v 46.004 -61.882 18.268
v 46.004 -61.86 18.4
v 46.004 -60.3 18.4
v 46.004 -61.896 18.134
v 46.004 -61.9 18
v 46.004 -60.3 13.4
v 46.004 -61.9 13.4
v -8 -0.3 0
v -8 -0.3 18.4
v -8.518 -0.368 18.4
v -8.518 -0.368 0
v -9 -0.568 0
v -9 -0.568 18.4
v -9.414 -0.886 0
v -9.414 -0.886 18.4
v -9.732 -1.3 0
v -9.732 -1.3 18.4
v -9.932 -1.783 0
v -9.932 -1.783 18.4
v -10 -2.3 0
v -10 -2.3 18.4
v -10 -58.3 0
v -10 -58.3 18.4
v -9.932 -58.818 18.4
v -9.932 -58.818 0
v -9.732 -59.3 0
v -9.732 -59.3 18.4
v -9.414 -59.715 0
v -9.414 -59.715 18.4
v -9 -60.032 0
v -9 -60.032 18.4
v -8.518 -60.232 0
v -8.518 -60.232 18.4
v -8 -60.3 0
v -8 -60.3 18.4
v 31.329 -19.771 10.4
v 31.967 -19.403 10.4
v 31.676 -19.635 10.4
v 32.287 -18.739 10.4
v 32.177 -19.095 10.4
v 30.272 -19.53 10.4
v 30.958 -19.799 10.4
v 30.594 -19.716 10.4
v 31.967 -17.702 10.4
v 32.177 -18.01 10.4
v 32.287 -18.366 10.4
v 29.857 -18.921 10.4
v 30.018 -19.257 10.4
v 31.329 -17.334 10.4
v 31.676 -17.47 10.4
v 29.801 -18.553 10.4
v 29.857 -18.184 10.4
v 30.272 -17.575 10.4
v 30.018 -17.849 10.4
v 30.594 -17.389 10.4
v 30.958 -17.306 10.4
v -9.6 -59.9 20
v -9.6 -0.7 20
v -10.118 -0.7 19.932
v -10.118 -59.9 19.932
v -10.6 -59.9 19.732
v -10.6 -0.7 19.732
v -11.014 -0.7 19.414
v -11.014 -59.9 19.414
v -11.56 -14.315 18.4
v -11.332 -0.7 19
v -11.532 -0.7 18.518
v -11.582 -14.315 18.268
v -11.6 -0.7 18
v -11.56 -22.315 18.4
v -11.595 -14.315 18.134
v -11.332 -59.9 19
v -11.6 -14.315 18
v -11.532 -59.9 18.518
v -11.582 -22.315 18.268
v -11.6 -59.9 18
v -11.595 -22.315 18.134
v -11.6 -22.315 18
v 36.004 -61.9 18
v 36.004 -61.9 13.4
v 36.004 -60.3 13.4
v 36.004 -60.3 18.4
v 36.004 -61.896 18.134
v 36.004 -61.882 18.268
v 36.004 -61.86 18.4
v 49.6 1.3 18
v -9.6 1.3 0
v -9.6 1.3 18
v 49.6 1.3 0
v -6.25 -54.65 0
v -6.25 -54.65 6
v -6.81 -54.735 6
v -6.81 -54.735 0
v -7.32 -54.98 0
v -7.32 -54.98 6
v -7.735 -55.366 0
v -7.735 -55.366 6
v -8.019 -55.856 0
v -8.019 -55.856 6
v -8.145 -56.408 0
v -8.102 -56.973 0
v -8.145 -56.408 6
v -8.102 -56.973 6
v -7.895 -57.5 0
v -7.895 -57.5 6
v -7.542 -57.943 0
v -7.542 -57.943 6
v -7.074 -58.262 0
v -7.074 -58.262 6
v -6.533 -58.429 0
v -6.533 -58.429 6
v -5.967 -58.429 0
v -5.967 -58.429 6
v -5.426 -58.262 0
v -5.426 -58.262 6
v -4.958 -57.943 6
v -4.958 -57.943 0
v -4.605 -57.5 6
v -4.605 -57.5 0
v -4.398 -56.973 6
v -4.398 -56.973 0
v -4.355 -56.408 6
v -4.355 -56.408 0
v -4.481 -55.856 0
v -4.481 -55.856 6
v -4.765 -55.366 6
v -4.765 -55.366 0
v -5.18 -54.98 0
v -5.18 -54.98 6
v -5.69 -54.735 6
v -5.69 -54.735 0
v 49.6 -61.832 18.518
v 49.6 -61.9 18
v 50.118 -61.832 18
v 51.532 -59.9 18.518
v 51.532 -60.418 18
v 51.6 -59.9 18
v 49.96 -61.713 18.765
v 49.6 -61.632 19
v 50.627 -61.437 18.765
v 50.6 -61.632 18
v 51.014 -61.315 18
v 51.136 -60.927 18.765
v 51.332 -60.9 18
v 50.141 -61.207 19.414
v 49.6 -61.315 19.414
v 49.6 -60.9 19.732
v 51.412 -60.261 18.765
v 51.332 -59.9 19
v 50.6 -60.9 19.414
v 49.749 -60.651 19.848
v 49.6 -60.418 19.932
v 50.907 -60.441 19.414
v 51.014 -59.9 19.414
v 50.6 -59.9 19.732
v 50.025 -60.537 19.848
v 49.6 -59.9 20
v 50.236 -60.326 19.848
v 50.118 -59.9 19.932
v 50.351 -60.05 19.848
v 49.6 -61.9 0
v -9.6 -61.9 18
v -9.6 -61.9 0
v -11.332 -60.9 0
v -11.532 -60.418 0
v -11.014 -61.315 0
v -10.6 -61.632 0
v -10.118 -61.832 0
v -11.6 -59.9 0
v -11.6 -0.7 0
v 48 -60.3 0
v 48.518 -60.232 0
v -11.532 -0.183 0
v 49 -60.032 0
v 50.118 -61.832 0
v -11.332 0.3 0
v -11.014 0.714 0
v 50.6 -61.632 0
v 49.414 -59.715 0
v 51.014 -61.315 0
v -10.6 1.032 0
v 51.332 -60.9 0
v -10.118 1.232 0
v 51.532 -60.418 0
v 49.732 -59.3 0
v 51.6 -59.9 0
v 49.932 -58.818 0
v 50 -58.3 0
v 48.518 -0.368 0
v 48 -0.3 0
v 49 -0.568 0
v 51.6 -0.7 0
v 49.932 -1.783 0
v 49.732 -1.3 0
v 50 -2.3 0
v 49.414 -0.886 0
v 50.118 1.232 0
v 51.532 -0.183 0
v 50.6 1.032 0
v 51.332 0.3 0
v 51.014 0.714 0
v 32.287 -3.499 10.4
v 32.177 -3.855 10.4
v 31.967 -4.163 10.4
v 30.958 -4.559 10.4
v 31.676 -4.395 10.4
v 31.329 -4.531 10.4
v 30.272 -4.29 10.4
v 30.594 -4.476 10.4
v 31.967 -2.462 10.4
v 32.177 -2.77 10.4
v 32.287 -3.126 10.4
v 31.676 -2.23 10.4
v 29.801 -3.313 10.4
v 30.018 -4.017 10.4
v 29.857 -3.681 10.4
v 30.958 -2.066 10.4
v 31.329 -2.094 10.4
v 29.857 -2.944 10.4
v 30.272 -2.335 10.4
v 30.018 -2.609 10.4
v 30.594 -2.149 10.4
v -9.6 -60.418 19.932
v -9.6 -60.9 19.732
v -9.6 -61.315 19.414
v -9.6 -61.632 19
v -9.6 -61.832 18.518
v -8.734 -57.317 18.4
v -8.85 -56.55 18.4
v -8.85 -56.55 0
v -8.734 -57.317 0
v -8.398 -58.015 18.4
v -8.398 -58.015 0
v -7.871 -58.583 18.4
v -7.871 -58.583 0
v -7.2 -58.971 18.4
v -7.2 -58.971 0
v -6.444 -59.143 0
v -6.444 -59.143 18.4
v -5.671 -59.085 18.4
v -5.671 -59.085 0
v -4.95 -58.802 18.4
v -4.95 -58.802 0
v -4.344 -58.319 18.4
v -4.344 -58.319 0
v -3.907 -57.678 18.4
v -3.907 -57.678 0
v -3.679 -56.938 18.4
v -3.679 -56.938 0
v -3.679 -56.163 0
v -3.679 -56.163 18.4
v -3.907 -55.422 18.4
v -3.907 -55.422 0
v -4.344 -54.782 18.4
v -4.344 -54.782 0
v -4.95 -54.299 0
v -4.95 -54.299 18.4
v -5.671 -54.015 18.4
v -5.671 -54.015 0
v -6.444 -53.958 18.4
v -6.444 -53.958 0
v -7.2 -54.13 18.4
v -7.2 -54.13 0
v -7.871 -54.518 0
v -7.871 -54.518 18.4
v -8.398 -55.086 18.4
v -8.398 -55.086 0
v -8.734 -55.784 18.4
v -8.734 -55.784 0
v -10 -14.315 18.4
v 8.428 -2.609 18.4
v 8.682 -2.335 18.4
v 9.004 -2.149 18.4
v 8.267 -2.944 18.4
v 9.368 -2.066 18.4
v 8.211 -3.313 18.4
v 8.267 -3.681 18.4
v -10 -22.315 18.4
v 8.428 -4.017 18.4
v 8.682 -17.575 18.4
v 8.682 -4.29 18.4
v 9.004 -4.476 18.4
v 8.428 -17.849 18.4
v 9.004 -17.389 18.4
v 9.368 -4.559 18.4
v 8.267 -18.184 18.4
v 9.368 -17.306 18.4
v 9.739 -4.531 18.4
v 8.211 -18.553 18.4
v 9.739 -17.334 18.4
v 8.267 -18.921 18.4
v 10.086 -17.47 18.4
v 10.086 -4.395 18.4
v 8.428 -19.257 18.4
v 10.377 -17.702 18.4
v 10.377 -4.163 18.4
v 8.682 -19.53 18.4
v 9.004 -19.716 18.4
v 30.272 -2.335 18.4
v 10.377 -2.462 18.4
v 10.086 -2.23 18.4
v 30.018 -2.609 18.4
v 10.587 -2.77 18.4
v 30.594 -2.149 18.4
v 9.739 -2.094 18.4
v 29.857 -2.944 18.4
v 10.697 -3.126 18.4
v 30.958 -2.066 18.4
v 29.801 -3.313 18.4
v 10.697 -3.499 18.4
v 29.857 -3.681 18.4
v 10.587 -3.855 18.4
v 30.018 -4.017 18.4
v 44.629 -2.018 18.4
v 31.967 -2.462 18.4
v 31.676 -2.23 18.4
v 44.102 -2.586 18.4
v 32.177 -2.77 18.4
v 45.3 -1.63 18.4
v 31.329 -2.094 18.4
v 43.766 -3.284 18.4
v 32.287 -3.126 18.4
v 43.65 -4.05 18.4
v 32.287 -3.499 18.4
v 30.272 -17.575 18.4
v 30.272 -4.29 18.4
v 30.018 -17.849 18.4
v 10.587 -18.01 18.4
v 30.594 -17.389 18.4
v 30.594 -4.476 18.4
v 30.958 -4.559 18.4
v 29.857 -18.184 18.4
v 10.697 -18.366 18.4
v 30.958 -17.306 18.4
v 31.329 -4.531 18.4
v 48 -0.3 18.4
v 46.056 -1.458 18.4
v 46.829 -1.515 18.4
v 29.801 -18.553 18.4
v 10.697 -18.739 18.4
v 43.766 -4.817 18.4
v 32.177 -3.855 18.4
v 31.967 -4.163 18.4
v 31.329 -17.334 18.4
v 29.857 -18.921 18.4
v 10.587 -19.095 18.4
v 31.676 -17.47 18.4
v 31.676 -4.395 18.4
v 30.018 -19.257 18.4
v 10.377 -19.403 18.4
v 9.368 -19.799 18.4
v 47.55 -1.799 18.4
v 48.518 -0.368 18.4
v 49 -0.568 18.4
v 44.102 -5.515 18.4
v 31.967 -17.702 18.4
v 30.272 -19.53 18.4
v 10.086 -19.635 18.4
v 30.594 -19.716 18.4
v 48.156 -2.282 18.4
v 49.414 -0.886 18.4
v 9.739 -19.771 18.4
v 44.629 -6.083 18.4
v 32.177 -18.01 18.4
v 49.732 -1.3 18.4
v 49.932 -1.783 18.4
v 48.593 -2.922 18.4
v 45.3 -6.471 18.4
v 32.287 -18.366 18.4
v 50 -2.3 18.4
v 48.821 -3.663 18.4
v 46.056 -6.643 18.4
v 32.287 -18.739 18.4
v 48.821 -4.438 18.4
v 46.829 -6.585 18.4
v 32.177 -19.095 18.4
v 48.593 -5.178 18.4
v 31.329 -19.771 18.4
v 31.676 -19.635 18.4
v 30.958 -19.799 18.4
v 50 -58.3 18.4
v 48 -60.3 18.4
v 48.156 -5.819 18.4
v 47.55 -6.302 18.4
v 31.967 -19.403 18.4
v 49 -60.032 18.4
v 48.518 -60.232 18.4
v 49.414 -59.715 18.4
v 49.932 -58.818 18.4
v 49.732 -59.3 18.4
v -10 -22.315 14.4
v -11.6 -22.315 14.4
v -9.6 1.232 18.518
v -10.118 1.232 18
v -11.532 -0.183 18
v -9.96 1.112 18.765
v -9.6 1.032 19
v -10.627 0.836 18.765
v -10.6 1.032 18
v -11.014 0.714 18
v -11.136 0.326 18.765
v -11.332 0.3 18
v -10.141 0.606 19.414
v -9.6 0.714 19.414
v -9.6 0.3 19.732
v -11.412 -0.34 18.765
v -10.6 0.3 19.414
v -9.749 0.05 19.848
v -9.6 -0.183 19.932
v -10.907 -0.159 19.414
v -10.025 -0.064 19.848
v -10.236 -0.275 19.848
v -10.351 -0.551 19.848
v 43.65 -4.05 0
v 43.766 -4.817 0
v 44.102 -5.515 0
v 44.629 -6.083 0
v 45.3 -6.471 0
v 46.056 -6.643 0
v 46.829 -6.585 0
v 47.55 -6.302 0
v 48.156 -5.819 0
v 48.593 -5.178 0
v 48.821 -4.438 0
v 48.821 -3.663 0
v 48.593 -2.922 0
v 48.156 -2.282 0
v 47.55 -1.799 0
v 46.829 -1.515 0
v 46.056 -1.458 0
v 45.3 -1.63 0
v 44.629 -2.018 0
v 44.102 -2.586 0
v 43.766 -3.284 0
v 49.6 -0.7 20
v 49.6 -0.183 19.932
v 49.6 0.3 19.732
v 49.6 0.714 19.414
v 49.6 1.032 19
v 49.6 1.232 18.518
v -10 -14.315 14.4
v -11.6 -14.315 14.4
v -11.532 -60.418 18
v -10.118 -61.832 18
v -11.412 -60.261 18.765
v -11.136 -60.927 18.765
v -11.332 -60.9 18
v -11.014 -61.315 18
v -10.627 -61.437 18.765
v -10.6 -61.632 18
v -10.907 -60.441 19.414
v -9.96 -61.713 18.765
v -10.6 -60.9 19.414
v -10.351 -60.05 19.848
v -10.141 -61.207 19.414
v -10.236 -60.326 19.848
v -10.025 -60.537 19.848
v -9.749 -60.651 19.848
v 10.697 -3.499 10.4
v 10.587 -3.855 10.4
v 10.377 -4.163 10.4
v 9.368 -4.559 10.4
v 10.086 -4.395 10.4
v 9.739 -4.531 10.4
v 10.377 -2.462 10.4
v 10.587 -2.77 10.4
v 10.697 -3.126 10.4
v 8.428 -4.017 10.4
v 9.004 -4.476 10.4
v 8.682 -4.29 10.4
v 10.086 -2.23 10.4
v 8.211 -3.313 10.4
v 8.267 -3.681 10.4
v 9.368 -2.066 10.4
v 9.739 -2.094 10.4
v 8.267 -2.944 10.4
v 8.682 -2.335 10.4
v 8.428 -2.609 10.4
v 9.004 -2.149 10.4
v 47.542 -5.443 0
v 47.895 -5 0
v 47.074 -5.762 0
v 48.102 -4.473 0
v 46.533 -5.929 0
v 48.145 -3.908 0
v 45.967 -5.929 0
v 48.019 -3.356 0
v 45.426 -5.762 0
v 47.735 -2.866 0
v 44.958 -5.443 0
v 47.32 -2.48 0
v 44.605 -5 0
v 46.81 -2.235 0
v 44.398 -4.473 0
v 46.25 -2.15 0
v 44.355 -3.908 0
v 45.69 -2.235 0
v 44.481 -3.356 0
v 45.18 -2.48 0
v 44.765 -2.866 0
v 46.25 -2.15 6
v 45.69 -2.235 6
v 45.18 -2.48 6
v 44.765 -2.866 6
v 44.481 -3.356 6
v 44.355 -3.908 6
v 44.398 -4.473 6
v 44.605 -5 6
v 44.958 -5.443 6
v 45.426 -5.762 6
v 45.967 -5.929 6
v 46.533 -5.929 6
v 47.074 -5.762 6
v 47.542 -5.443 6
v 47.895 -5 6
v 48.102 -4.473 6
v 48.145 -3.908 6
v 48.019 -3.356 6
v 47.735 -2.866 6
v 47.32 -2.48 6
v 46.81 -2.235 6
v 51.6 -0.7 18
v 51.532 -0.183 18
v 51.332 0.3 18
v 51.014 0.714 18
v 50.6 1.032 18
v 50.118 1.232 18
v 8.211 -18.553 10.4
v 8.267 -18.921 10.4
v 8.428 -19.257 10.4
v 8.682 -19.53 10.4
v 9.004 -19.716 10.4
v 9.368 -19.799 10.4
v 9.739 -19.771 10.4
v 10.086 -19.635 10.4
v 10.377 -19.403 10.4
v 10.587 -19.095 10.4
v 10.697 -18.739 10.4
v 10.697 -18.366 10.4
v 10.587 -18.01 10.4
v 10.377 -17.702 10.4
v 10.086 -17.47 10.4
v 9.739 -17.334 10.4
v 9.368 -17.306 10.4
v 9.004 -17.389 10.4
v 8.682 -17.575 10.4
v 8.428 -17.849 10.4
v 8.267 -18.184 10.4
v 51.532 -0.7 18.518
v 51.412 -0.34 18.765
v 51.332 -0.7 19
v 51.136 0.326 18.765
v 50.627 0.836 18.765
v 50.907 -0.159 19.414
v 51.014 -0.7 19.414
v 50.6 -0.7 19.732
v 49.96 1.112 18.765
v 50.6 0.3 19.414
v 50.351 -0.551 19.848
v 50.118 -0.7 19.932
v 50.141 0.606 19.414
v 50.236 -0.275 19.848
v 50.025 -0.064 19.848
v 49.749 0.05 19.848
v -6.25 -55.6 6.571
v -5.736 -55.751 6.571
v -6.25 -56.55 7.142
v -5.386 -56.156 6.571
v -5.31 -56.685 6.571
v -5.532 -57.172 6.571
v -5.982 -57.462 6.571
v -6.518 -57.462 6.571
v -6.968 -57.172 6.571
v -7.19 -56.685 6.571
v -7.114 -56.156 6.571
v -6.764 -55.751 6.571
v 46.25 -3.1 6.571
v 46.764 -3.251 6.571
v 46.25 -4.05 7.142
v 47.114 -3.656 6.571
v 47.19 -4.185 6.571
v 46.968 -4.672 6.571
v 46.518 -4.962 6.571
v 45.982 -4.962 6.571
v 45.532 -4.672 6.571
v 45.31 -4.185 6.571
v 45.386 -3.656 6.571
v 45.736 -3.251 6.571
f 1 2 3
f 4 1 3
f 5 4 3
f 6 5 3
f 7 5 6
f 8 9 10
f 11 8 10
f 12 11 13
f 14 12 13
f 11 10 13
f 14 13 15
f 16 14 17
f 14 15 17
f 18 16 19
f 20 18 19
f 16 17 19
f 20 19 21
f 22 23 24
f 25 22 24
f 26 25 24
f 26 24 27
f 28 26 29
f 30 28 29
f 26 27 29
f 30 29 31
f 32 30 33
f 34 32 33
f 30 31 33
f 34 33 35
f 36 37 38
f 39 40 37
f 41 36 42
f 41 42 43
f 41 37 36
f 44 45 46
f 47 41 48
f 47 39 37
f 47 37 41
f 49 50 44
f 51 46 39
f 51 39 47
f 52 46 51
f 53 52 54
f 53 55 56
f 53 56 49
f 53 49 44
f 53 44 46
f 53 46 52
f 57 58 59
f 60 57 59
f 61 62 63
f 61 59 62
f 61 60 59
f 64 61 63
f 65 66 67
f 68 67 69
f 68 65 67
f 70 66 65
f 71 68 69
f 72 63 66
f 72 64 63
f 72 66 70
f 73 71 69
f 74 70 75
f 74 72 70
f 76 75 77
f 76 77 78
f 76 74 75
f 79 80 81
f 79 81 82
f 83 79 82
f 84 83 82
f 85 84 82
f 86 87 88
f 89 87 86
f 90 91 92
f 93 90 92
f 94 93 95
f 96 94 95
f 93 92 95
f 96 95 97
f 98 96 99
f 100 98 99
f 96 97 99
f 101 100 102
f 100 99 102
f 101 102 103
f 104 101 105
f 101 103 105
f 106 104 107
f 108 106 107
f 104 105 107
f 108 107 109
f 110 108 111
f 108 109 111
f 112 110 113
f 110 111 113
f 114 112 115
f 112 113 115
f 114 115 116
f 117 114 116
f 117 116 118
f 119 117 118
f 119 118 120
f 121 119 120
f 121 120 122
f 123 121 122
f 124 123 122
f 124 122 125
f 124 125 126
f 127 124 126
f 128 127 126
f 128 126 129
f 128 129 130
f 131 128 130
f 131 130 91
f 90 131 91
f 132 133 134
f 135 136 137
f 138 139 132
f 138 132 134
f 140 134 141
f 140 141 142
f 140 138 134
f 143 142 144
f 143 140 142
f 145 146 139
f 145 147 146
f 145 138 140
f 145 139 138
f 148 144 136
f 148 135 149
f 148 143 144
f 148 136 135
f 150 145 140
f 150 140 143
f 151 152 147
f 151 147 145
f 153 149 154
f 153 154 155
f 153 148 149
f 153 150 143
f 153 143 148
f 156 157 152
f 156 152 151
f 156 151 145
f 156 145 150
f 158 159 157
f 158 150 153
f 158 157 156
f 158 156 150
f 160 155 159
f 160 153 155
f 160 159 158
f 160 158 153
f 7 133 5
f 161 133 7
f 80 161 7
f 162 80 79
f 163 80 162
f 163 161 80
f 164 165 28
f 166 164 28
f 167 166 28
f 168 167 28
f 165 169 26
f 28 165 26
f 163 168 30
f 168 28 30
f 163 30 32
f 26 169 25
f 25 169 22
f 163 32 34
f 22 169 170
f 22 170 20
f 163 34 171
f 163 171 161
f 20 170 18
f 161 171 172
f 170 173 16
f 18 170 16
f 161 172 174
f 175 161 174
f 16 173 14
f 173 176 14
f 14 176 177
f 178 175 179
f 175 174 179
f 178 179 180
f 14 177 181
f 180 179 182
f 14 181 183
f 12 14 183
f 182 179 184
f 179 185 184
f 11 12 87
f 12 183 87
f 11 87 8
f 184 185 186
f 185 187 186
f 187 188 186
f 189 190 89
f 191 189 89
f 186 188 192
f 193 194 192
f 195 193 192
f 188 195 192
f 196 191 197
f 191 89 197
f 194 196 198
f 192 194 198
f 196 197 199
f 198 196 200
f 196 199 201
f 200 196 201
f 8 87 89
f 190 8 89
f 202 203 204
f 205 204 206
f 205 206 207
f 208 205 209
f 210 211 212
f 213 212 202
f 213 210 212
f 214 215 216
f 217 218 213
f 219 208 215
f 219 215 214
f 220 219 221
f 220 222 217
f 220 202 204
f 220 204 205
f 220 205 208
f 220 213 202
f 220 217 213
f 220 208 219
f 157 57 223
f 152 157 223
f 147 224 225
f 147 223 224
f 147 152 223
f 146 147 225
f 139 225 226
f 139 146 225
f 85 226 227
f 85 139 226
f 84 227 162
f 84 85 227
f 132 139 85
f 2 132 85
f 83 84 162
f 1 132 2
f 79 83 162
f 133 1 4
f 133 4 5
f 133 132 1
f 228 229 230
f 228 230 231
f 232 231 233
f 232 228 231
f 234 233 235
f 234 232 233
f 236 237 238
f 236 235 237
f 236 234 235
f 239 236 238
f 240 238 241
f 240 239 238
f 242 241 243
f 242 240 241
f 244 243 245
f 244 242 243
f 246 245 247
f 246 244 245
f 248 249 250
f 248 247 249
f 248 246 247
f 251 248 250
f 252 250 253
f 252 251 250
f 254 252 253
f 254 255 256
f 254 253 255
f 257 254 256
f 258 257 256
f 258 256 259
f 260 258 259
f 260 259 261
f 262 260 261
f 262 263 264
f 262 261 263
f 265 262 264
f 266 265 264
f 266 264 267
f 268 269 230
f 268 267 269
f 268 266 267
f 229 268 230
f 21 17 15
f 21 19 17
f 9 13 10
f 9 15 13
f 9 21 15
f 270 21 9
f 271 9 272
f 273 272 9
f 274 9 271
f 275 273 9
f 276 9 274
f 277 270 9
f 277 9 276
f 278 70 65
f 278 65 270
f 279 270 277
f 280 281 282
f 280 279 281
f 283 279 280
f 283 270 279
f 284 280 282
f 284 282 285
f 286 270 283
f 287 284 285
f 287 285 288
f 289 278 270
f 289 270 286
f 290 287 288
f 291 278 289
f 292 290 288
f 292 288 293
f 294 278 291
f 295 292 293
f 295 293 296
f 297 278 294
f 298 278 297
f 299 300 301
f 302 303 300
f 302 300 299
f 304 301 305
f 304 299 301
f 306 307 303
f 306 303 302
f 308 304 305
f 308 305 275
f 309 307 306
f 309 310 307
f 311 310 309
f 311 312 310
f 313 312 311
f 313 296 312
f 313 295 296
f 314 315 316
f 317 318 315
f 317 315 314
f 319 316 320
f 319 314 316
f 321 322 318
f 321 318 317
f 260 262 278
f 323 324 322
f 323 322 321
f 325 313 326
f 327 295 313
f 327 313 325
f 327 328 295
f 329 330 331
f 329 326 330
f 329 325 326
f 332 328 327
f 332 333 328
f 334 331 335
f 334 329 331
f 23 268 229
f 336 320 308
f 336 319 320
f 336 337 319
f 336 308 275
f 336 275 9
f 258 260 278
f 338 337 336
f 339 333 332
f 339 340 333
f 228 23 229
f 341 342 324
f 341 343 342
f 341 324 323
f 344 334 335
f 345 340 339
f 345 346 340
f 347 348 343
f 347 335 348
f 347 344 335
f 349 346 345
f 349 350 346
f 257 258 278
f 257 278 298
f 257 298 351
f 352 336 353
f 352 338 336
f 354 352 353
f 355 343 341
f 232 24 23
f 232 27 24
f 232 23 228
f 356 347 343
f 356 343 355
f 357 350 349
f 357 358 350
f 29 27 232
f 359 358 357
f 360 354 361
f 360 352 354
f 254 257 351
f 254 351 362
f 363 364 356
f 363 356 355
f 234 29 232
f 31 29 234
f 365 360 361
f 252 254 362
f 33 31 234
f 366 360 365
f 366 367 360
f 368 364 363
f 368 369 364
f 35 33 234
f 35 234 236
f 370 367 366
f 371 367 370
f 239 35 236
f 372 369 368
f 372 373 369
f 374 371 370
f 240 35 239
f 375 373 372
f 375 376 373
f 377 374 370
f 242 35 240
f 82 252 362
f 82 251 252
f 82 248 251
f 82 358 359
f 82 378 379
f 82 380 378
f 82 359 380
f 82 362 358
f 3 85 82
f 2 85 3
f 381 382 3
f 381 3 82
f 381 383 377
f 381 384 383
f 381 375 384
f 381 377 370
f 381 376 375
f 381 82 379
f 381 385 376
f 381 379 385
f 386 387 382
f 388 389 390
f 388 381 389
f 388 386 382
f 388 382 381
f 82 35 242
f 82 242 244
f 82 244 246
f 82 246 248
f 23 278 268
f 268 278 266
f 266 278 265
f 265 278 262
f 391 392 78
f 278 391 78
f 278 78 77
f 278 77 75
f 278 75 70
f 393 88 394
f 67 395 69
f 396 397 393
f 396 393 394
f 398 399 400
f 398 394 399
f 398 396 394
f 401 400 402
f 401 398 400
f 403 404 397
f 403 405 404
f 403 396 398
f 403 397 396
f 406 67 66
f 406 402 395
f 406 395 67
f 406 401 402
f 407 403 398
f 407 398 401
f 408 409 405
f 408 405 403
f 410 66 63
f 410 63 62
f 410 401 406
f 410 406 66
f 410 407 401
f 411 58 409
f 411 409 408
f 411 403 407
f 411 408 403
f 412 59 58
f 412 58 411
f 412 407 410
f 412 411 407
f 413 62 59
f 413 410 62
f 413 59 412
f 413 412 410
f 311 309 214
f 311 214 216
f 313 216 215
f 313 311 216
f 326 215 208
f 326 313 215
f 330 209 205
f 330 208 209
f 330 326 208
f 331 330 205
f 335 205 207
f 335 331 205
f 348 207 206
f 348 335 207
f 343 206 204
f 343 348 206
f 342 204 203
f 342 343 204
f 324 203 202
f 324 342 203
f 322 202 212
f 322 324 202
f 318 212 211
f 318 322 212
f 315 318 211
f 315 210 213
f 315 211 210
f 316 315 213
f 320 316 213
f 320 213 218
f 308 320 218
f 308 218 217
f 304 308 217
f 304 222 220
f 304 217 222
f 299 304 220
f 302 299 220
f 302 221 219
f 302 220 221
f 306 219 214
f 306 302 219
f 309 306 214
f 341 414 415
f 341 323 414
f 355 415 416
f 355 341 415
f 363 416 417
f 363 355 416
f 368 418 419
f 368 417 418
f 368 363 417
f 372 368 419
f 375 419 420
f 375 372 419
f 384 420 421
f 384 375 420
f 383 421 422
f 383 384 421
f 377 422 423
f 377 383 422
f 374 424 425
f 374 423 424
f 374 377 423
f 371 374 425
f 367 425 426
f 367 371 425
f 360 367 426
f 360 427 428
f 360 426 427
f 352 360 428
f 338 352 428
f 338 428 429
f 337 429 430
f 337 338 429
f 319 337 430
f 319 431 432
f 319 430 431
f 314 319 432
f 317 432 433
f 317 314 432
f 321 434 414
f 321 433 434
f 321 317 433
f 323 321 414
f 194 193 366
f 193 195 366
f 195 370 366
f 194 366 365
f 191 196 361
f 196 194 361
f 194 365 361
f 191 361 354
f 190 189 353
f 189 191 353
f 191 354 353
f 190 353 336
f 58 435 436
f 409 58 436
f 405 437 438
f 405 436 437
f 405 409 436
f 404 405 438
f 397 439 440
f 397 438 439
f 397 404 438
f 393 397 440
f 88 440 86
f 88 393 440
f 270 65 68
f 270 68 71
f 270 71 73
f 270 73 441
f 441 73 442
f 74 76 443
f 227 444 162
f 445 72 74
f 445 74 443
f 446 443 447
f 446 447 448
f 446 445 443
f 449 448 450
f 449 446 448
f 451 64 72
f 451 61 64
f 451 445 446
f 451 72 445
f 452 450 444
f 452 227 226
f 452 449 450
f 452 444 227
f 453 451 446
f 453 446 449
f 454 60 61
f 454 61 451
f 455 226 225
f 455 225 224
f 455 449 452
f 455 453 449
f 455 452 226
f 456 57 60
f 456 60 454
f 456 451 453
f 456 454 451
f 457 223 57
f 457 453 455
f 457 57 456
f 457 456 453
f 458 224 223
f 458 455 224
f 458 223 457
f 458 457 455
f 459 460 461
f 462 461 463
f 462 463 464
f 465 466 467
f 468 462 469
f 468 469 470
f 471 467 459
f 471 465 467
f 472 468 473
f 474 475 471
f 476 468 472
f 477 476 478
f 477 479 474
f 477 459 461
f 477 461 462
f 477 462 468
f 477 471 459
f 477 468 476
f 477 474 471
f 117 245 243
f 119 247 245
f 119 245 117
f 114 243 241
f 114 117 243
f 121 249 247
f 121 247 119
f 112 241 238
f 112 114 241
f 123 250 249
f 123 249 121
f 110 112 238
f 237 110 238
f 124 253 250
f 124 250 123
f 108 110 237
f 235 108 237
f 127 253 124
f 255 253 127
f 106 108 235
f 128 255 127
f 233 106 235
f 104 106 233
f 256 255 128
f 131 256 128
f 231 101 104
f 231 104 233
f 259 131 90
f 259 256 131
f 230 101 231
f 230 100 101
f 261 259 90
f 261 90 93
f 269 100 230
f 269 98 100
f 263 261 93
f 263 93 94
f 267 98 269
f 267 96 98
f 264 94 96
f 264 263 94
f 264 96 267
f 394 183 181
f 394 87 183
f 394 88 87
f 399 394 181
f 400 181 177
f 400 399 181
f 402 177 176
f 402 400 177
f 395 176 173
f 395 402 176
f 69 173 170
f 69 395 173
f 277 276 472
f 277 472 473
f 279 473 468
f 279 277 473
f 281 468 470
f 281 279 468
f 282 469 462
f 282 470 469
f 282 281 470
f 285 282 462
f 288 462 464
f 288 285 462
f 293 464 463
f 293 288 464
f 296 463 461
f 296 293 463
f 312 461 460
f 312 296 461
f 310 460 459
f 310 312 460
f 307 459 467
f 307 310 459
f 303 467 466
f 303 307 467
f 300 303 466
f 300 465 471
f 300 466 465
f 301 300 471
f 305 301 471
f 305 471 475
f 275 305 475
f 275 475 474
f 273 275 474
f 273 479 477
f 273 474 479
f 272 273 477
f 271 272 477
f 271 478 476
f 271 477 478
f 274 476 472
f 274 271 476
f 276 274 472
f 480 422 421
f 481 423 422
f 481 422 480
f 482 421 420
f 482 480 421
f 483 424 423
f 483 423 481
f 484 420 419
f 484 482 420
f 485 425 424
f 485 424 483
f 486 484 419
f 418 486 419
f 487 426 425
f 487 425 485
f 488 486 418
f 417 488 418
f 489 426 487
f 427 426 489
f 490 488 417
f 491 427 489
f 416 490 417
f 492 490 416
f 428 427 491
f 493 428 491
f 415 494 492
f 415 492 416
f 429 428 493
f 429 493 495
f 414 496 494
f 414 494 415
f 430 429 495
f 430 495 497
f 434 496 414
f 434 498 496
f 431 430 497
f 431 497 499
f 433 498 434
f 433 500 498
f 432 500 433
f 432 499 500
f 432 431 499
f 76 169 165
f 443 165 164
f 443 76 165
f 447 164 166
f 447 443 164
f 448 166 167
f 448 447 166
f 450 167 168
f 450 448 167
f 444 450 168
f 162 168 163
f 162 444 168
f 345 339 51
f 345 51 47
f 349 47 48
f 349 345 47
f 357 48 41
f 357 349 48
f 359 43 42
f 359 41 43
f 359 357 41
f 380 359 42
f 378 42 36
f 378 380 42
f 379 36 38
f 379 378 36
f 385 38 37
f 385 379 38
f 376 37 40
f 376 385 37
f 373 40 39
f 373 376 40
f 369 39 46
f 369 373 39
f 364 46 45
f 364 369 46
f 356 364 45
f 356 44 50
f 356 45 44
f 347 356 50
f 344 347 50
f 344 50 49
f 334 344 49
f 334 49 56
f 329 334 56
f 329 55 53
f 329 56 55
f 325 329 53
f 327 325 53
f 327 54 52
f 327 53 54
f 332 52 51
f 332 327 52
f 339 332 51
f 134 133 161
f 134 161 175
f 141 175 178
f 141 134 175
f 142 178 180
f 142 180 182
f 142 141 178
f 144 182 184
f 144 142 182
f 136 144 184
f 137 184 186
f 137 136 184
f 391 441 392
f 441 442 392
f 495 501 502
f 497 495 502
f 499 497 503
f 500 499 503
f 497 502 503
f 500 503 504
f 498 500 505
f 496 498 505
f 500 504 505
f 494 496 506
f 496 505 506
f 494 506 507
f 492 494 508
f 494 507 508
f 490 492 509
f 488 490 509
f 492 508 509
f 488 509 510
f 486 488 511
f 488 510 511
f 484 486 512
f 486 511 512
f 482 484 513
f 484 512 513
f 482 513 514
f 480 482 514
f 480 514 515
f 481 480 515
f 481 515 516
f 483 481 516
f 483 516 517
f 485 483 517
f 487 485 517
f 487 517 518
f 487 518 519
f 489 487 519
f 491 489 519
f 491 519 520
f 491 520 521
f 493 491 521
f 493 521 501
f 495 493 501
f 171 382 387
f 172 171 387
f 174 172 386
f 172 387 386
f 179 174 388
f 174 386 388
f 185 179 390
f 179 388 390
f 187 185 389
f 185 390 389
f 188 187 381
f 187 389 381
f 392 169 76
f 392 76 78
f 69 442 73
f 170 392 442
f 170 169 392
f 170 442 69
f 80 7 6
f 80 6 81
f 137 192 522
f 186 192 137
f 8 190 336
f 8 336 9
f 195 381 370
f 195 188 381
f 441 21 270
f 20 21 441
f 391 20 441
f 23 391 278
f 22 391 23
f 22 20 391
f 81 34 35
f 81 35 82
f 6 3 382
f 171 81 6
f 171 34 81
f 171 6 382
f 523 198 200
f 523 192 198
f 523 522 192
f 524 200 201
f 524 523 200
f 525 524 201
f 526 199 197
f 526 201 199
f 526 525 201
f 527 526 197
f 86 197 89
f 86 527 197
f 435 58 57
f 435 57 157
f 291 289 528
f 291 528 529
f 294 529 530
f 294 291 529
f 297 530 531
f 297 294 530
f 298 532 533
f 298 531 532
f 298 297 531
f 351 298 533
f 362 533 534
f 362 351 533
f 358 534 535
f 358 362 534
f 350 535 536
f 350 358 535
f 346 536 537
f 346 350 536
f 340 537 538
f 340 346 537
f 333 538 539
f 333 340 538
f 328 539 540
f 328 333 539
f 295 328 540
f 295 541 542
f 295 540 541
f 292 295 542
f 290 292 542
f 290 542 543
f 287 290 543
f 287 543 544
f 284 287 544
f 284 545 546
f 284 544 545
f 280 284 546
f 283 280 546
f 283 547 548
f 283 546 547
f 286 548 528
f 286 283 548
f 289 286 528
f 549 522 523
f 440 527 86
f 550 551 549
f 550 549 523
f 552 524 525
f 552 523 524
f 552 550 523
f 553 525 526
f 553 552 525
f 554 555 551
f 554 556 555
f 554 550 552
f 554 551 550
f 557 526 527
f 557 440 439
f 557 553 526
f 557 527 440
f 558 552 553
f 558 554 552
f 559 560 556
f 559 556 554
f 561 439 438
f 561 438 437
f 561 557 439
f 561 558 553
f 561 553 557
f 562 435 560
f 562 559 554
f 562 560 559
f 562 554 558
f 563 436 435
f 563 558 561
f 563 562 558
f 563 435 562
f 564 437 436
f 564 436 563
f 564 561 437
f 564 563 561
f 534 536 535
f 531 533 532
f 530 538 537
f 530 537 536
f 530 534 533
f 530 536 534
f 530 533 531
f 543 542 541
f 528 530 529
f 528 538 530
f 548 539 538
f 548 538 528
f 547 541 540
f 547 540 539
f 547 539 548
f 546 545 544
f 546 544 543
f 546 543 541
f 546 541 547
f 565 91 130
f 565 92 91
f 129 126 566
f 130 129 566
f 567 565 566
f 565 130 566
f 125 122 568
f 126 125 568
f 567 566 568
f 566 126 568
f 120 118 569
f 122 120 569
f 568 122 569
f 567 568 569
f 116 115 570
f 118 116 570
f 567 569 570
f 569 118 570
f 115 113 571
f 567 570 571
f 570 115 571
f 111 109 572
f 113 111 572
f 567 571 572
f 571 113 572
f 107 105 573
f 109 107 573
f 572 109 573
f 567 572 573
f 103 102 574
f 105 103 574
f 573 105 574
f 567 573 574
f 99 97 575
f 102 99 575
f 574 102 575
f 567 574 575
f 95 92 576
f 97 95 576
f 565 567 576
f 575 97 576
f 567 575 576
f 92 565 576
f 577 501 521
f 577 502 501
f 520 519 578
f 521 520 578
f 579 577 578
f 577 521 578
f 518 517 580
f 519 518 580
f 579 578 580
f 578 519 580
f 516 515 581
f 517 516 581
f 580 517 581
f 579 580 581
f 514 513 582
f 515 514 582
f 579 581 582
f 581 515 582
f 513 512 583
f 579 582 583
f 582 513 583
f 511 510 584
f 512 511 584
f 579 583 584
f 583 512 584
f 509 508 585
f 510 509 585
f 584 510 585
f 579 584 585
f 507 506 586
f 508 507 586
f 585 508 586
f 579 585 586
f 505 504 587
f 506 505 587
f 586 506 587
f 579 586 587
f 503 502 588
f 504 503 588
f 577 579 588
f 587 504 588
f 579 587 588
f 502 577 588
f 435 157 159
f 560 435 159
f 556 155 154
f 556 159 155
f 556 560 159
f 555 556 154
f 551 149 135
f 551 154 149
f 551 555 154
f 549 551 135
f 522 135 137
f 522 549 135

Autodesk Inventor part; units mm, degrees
ref_plane "YZ Plane" through (0, 0, 0) normal (1, 0, 0) x (0, 1, 0)
ref_plane "XZ Plane" through (0, 0, 0) normal (0, 1, 0) x (-1, 0, 0)
ref_plane "XY Plane" through (0, 0, 0) normal (0, 0, 1) x (1, 0, 0)
sketch "Sketch1" plane through (0, 0, 0) normal (0, 0, 1) x (1, 0, 0)
  line L0 (-10, -0.3003) -> (50, -0.3003)
  line L1 (50, -0.3003) -> (50, -60.3003)
  line L2 (50, -60.3003) -> (-10, -60.3003)
  line L3 (-10, -60.3003) -> (-10, -0.3003)
  line L4 (-11.6, 1.2997) -> (51.6, 1.2997)
  line L5 (51.6, 1.2997) -> (51.6, -61.9003)
  line L6 (51.6, -61.9003) -> (-11.6, -61.9003)
  line L7 (-11.6, -61.9003) -> (-11.6, 1.2997)
  point P0 (-10, -30.3003)
  point P1 (-11.6, -30.3003)
  dimension "d1" = 60
  dimension "d2" = 60
  dimension "d3" = 1.6
  dimension "d4" = 1.6
  dimension "d5" = 1.6
  dimension "d6" = 1.6
extrude "Extrusion1" add sketch "Sketch1" along normal blind 20 contours L0 L1 L2 L3 | L4 L5 L6 L7
sketch "Sketch2" plane through (0, 0, 0) normal (0, 0, -1) x (-1, 0, 0)
  line L0 (-50, -0.3003) -> (10, -0.3003)
  line L1 (10, -0.3003) -> (10, -60.3003)
  line L2 (10, -60.3003) -> (-50, -60.3003)
  line L3 (-50, -60.3003) -> (-50, -0.3003)
  line L4 (-51.6, 1.2997) -> (11.6, 1.2997) projected
  line L5 (11.6, -61.9003) -> (-51.6, -61.9003) projected
  line L6 (-51.6, -61.9003) -> (-51.6, 1.2997) projected
  line L7 (11.6, 1.2997) -> (11.6, -61.9003) projected
  point P0 (0, 0)
  dimension "d9" = 60
  dimension "d10" = 1.6
  dimension "d11" = 1.6
  dimension "d12" = 1.6
  dimension "d61" = 1.6
extrude "Extrusion2" cut sketch "Sketch2" against normal blind 18.4 contours L0 L1 L2 L3
sketch "Sketch3" plane through (-11.6, -61.9003, 0) normal (0, -1, 0) x (1, 0, 0)
  line L0 (57.6038, 13.4) -> (47.6038, 13.4)
  line L1 (47.6038, 13.4) -> (47.6038, 18.4)
  line L2 (47.6038, 18.4) -> (57.6038, 18.4)
  line L3 (57.6038, 18.4) -> (57.6038, 13.4)
  line L4 (0, 20) -> (63.2, 20) projected
  point P0 (11.6, 0)
  point P1 (52.6038, 18.4)
  dimension "d15" = 10
  dimension "d16" = 5
  dimension "d17" = 1.6
extrude "Extrusion3" cut sketch "Sketch3" against normal blind 18.4
fillet "Fillet1" radius 2 1 edges at (-11.6, -61.9003, 10)
fillet "Fillet2" radius 2 3 edges at (-11.6, 1.2997, 10) (51.6, 1.2997, 10) (51.6, -61.9003, 10)
fillet "Fillet3" radius 2 8 edges at (51.0142, -61.3145, 20) (51.6, -30.3003, 20) (51.0142, 0.7139, 20) (20, 1.2997, 20) (-11.0142, 0.7139, 20) (-11.6, -30.3003, 20) (-11.0142, -61.3145, 20) (20, -61.9003, 20)
sketch "Sketch4" plane through (-11.6, -59.9003, 0) normal (-1, 0, 0) x (0, 0, 1)
  line L0 (14.4, 37.5852) -> (18.4, 37.5852)
  line L1 (18.4, 37.5852) -> (18.4, 45.5852)
  line L2 (18.4, 45.5852) -> (14.4, 45.5852)
  line L3 (14.4, 45.5852) -> (14.4, 37.5852)
  line L4 (20, 0) -> (20, 59.2) projected
  point P0 (0, 59.9003)
  point P1 (18.4, 41.5852)
  dimension "d23" = 4
  dimension "d24" = 8
  dimension "d25" = 1.6
extrude "Extrusion4" cut sketch "Sketch4" against normal blind 18.4
sketch "Sketch5" plane through (0, 0, 18.4) normal (0, 0, -1) x (-1, 0, 0)
  point P0 (0, 0)
sketch "Sketch6" plane through (0, 0, 18.4) normal (0, 0, -1) x (-1, 0, 0)
  point P0 (0, 0)
fillet "Fillet4" radius 2 4 edges at (50, -0.3003, 9.2) (-10, -0.3003, 9.2) (-10, -60.3003, 9.2) (50, -60.3003, 9.2)
sketch "Sketch7" plane through (0, 0, 18.4) normal (0, 0, -1) x (-1, 0, 0)
  point P0 (0, 0)
sketch "Sketch8" plane through (0, 0, 18.4) normal (0, 0, -1) x (-1, 0, 0)
  circle A0 centre (-46.25, -4.0503) radius 2.6
  circle A1 centre (6.25, -56.5503) radius 2.6
  line L0 (-48, -0.3003) -> (8, -0.3003) projected
  line L1 (-50, -58.3003) -> (-50, -2.3003) projected
  line L2 (10, -2.3003) -> (10, -58.3003) projected
  line L3 (8, -60.3003) -> (-48, -60.3003) projected
  point P0 (0, 0)
  dimension "d30" = 5.2
  dimension "d31" = 5.2
  dimension "d32" = 3.75
  dimension "d33" = 3.75
  dimension "d34" = 3.75
  dimension "d35" = 3.75
extrude "Extrusion5" add sketch "Sketch8" along normal up to surface (18.4 mm away)
sketch "Sketch9" plane through (46.25, -4.0503, 0) normal (0, 0, -1) x (-1, 0, 0)
  circle A0 centre (0, 0) radius 2.6 projected
  point P0 (46.25, 4.0503)
hole "Hole1" at (46.25, -4.0503, 0) direction (0, 0, 1) diameter 3.8 depth 6 tip angle 118
sketch "Sketch10" plane through (-6.25, -56.5503, 0) normal (0, 0, -1) x (-1, 0, 0)
  circle A0 centre (0, 0) radius 2.6 projected
  point P0 (-6.25, 56.5503)
hole "Hole2" at (-6.25, -56.5503, 0) direction (0, 0, 1) diameter 3.8 depth 6 tip angle 118
sketch "Sketch11" plane through (0, 0, 18.4) normal (0, 0, -1) x (-1, 0, 0)
  circle A0 centre (-9.4611, -3.3127) radius 1.25
  circle A1 centre (-9.4611, -18.5527) radius 1.25
  circle A2 centre (-31.0511, -3.3127) radius 1.25
  circle A3 centre (-31.0511, -18.5527) radius 1.25
  line L0 (-50, -58.3003) -> (-50, -2.3003) projected
  point P0 (0, 0)
  dimension "d54" = 2.5
  dimension "d55" = 2.5
  dimension "d56" = 2.5
  dimension "d57" = 2.5
extrude "Extrusion6" add sketch "Sketch11" along normal blind 8
properties part number "LimB_module" material "Brass"
